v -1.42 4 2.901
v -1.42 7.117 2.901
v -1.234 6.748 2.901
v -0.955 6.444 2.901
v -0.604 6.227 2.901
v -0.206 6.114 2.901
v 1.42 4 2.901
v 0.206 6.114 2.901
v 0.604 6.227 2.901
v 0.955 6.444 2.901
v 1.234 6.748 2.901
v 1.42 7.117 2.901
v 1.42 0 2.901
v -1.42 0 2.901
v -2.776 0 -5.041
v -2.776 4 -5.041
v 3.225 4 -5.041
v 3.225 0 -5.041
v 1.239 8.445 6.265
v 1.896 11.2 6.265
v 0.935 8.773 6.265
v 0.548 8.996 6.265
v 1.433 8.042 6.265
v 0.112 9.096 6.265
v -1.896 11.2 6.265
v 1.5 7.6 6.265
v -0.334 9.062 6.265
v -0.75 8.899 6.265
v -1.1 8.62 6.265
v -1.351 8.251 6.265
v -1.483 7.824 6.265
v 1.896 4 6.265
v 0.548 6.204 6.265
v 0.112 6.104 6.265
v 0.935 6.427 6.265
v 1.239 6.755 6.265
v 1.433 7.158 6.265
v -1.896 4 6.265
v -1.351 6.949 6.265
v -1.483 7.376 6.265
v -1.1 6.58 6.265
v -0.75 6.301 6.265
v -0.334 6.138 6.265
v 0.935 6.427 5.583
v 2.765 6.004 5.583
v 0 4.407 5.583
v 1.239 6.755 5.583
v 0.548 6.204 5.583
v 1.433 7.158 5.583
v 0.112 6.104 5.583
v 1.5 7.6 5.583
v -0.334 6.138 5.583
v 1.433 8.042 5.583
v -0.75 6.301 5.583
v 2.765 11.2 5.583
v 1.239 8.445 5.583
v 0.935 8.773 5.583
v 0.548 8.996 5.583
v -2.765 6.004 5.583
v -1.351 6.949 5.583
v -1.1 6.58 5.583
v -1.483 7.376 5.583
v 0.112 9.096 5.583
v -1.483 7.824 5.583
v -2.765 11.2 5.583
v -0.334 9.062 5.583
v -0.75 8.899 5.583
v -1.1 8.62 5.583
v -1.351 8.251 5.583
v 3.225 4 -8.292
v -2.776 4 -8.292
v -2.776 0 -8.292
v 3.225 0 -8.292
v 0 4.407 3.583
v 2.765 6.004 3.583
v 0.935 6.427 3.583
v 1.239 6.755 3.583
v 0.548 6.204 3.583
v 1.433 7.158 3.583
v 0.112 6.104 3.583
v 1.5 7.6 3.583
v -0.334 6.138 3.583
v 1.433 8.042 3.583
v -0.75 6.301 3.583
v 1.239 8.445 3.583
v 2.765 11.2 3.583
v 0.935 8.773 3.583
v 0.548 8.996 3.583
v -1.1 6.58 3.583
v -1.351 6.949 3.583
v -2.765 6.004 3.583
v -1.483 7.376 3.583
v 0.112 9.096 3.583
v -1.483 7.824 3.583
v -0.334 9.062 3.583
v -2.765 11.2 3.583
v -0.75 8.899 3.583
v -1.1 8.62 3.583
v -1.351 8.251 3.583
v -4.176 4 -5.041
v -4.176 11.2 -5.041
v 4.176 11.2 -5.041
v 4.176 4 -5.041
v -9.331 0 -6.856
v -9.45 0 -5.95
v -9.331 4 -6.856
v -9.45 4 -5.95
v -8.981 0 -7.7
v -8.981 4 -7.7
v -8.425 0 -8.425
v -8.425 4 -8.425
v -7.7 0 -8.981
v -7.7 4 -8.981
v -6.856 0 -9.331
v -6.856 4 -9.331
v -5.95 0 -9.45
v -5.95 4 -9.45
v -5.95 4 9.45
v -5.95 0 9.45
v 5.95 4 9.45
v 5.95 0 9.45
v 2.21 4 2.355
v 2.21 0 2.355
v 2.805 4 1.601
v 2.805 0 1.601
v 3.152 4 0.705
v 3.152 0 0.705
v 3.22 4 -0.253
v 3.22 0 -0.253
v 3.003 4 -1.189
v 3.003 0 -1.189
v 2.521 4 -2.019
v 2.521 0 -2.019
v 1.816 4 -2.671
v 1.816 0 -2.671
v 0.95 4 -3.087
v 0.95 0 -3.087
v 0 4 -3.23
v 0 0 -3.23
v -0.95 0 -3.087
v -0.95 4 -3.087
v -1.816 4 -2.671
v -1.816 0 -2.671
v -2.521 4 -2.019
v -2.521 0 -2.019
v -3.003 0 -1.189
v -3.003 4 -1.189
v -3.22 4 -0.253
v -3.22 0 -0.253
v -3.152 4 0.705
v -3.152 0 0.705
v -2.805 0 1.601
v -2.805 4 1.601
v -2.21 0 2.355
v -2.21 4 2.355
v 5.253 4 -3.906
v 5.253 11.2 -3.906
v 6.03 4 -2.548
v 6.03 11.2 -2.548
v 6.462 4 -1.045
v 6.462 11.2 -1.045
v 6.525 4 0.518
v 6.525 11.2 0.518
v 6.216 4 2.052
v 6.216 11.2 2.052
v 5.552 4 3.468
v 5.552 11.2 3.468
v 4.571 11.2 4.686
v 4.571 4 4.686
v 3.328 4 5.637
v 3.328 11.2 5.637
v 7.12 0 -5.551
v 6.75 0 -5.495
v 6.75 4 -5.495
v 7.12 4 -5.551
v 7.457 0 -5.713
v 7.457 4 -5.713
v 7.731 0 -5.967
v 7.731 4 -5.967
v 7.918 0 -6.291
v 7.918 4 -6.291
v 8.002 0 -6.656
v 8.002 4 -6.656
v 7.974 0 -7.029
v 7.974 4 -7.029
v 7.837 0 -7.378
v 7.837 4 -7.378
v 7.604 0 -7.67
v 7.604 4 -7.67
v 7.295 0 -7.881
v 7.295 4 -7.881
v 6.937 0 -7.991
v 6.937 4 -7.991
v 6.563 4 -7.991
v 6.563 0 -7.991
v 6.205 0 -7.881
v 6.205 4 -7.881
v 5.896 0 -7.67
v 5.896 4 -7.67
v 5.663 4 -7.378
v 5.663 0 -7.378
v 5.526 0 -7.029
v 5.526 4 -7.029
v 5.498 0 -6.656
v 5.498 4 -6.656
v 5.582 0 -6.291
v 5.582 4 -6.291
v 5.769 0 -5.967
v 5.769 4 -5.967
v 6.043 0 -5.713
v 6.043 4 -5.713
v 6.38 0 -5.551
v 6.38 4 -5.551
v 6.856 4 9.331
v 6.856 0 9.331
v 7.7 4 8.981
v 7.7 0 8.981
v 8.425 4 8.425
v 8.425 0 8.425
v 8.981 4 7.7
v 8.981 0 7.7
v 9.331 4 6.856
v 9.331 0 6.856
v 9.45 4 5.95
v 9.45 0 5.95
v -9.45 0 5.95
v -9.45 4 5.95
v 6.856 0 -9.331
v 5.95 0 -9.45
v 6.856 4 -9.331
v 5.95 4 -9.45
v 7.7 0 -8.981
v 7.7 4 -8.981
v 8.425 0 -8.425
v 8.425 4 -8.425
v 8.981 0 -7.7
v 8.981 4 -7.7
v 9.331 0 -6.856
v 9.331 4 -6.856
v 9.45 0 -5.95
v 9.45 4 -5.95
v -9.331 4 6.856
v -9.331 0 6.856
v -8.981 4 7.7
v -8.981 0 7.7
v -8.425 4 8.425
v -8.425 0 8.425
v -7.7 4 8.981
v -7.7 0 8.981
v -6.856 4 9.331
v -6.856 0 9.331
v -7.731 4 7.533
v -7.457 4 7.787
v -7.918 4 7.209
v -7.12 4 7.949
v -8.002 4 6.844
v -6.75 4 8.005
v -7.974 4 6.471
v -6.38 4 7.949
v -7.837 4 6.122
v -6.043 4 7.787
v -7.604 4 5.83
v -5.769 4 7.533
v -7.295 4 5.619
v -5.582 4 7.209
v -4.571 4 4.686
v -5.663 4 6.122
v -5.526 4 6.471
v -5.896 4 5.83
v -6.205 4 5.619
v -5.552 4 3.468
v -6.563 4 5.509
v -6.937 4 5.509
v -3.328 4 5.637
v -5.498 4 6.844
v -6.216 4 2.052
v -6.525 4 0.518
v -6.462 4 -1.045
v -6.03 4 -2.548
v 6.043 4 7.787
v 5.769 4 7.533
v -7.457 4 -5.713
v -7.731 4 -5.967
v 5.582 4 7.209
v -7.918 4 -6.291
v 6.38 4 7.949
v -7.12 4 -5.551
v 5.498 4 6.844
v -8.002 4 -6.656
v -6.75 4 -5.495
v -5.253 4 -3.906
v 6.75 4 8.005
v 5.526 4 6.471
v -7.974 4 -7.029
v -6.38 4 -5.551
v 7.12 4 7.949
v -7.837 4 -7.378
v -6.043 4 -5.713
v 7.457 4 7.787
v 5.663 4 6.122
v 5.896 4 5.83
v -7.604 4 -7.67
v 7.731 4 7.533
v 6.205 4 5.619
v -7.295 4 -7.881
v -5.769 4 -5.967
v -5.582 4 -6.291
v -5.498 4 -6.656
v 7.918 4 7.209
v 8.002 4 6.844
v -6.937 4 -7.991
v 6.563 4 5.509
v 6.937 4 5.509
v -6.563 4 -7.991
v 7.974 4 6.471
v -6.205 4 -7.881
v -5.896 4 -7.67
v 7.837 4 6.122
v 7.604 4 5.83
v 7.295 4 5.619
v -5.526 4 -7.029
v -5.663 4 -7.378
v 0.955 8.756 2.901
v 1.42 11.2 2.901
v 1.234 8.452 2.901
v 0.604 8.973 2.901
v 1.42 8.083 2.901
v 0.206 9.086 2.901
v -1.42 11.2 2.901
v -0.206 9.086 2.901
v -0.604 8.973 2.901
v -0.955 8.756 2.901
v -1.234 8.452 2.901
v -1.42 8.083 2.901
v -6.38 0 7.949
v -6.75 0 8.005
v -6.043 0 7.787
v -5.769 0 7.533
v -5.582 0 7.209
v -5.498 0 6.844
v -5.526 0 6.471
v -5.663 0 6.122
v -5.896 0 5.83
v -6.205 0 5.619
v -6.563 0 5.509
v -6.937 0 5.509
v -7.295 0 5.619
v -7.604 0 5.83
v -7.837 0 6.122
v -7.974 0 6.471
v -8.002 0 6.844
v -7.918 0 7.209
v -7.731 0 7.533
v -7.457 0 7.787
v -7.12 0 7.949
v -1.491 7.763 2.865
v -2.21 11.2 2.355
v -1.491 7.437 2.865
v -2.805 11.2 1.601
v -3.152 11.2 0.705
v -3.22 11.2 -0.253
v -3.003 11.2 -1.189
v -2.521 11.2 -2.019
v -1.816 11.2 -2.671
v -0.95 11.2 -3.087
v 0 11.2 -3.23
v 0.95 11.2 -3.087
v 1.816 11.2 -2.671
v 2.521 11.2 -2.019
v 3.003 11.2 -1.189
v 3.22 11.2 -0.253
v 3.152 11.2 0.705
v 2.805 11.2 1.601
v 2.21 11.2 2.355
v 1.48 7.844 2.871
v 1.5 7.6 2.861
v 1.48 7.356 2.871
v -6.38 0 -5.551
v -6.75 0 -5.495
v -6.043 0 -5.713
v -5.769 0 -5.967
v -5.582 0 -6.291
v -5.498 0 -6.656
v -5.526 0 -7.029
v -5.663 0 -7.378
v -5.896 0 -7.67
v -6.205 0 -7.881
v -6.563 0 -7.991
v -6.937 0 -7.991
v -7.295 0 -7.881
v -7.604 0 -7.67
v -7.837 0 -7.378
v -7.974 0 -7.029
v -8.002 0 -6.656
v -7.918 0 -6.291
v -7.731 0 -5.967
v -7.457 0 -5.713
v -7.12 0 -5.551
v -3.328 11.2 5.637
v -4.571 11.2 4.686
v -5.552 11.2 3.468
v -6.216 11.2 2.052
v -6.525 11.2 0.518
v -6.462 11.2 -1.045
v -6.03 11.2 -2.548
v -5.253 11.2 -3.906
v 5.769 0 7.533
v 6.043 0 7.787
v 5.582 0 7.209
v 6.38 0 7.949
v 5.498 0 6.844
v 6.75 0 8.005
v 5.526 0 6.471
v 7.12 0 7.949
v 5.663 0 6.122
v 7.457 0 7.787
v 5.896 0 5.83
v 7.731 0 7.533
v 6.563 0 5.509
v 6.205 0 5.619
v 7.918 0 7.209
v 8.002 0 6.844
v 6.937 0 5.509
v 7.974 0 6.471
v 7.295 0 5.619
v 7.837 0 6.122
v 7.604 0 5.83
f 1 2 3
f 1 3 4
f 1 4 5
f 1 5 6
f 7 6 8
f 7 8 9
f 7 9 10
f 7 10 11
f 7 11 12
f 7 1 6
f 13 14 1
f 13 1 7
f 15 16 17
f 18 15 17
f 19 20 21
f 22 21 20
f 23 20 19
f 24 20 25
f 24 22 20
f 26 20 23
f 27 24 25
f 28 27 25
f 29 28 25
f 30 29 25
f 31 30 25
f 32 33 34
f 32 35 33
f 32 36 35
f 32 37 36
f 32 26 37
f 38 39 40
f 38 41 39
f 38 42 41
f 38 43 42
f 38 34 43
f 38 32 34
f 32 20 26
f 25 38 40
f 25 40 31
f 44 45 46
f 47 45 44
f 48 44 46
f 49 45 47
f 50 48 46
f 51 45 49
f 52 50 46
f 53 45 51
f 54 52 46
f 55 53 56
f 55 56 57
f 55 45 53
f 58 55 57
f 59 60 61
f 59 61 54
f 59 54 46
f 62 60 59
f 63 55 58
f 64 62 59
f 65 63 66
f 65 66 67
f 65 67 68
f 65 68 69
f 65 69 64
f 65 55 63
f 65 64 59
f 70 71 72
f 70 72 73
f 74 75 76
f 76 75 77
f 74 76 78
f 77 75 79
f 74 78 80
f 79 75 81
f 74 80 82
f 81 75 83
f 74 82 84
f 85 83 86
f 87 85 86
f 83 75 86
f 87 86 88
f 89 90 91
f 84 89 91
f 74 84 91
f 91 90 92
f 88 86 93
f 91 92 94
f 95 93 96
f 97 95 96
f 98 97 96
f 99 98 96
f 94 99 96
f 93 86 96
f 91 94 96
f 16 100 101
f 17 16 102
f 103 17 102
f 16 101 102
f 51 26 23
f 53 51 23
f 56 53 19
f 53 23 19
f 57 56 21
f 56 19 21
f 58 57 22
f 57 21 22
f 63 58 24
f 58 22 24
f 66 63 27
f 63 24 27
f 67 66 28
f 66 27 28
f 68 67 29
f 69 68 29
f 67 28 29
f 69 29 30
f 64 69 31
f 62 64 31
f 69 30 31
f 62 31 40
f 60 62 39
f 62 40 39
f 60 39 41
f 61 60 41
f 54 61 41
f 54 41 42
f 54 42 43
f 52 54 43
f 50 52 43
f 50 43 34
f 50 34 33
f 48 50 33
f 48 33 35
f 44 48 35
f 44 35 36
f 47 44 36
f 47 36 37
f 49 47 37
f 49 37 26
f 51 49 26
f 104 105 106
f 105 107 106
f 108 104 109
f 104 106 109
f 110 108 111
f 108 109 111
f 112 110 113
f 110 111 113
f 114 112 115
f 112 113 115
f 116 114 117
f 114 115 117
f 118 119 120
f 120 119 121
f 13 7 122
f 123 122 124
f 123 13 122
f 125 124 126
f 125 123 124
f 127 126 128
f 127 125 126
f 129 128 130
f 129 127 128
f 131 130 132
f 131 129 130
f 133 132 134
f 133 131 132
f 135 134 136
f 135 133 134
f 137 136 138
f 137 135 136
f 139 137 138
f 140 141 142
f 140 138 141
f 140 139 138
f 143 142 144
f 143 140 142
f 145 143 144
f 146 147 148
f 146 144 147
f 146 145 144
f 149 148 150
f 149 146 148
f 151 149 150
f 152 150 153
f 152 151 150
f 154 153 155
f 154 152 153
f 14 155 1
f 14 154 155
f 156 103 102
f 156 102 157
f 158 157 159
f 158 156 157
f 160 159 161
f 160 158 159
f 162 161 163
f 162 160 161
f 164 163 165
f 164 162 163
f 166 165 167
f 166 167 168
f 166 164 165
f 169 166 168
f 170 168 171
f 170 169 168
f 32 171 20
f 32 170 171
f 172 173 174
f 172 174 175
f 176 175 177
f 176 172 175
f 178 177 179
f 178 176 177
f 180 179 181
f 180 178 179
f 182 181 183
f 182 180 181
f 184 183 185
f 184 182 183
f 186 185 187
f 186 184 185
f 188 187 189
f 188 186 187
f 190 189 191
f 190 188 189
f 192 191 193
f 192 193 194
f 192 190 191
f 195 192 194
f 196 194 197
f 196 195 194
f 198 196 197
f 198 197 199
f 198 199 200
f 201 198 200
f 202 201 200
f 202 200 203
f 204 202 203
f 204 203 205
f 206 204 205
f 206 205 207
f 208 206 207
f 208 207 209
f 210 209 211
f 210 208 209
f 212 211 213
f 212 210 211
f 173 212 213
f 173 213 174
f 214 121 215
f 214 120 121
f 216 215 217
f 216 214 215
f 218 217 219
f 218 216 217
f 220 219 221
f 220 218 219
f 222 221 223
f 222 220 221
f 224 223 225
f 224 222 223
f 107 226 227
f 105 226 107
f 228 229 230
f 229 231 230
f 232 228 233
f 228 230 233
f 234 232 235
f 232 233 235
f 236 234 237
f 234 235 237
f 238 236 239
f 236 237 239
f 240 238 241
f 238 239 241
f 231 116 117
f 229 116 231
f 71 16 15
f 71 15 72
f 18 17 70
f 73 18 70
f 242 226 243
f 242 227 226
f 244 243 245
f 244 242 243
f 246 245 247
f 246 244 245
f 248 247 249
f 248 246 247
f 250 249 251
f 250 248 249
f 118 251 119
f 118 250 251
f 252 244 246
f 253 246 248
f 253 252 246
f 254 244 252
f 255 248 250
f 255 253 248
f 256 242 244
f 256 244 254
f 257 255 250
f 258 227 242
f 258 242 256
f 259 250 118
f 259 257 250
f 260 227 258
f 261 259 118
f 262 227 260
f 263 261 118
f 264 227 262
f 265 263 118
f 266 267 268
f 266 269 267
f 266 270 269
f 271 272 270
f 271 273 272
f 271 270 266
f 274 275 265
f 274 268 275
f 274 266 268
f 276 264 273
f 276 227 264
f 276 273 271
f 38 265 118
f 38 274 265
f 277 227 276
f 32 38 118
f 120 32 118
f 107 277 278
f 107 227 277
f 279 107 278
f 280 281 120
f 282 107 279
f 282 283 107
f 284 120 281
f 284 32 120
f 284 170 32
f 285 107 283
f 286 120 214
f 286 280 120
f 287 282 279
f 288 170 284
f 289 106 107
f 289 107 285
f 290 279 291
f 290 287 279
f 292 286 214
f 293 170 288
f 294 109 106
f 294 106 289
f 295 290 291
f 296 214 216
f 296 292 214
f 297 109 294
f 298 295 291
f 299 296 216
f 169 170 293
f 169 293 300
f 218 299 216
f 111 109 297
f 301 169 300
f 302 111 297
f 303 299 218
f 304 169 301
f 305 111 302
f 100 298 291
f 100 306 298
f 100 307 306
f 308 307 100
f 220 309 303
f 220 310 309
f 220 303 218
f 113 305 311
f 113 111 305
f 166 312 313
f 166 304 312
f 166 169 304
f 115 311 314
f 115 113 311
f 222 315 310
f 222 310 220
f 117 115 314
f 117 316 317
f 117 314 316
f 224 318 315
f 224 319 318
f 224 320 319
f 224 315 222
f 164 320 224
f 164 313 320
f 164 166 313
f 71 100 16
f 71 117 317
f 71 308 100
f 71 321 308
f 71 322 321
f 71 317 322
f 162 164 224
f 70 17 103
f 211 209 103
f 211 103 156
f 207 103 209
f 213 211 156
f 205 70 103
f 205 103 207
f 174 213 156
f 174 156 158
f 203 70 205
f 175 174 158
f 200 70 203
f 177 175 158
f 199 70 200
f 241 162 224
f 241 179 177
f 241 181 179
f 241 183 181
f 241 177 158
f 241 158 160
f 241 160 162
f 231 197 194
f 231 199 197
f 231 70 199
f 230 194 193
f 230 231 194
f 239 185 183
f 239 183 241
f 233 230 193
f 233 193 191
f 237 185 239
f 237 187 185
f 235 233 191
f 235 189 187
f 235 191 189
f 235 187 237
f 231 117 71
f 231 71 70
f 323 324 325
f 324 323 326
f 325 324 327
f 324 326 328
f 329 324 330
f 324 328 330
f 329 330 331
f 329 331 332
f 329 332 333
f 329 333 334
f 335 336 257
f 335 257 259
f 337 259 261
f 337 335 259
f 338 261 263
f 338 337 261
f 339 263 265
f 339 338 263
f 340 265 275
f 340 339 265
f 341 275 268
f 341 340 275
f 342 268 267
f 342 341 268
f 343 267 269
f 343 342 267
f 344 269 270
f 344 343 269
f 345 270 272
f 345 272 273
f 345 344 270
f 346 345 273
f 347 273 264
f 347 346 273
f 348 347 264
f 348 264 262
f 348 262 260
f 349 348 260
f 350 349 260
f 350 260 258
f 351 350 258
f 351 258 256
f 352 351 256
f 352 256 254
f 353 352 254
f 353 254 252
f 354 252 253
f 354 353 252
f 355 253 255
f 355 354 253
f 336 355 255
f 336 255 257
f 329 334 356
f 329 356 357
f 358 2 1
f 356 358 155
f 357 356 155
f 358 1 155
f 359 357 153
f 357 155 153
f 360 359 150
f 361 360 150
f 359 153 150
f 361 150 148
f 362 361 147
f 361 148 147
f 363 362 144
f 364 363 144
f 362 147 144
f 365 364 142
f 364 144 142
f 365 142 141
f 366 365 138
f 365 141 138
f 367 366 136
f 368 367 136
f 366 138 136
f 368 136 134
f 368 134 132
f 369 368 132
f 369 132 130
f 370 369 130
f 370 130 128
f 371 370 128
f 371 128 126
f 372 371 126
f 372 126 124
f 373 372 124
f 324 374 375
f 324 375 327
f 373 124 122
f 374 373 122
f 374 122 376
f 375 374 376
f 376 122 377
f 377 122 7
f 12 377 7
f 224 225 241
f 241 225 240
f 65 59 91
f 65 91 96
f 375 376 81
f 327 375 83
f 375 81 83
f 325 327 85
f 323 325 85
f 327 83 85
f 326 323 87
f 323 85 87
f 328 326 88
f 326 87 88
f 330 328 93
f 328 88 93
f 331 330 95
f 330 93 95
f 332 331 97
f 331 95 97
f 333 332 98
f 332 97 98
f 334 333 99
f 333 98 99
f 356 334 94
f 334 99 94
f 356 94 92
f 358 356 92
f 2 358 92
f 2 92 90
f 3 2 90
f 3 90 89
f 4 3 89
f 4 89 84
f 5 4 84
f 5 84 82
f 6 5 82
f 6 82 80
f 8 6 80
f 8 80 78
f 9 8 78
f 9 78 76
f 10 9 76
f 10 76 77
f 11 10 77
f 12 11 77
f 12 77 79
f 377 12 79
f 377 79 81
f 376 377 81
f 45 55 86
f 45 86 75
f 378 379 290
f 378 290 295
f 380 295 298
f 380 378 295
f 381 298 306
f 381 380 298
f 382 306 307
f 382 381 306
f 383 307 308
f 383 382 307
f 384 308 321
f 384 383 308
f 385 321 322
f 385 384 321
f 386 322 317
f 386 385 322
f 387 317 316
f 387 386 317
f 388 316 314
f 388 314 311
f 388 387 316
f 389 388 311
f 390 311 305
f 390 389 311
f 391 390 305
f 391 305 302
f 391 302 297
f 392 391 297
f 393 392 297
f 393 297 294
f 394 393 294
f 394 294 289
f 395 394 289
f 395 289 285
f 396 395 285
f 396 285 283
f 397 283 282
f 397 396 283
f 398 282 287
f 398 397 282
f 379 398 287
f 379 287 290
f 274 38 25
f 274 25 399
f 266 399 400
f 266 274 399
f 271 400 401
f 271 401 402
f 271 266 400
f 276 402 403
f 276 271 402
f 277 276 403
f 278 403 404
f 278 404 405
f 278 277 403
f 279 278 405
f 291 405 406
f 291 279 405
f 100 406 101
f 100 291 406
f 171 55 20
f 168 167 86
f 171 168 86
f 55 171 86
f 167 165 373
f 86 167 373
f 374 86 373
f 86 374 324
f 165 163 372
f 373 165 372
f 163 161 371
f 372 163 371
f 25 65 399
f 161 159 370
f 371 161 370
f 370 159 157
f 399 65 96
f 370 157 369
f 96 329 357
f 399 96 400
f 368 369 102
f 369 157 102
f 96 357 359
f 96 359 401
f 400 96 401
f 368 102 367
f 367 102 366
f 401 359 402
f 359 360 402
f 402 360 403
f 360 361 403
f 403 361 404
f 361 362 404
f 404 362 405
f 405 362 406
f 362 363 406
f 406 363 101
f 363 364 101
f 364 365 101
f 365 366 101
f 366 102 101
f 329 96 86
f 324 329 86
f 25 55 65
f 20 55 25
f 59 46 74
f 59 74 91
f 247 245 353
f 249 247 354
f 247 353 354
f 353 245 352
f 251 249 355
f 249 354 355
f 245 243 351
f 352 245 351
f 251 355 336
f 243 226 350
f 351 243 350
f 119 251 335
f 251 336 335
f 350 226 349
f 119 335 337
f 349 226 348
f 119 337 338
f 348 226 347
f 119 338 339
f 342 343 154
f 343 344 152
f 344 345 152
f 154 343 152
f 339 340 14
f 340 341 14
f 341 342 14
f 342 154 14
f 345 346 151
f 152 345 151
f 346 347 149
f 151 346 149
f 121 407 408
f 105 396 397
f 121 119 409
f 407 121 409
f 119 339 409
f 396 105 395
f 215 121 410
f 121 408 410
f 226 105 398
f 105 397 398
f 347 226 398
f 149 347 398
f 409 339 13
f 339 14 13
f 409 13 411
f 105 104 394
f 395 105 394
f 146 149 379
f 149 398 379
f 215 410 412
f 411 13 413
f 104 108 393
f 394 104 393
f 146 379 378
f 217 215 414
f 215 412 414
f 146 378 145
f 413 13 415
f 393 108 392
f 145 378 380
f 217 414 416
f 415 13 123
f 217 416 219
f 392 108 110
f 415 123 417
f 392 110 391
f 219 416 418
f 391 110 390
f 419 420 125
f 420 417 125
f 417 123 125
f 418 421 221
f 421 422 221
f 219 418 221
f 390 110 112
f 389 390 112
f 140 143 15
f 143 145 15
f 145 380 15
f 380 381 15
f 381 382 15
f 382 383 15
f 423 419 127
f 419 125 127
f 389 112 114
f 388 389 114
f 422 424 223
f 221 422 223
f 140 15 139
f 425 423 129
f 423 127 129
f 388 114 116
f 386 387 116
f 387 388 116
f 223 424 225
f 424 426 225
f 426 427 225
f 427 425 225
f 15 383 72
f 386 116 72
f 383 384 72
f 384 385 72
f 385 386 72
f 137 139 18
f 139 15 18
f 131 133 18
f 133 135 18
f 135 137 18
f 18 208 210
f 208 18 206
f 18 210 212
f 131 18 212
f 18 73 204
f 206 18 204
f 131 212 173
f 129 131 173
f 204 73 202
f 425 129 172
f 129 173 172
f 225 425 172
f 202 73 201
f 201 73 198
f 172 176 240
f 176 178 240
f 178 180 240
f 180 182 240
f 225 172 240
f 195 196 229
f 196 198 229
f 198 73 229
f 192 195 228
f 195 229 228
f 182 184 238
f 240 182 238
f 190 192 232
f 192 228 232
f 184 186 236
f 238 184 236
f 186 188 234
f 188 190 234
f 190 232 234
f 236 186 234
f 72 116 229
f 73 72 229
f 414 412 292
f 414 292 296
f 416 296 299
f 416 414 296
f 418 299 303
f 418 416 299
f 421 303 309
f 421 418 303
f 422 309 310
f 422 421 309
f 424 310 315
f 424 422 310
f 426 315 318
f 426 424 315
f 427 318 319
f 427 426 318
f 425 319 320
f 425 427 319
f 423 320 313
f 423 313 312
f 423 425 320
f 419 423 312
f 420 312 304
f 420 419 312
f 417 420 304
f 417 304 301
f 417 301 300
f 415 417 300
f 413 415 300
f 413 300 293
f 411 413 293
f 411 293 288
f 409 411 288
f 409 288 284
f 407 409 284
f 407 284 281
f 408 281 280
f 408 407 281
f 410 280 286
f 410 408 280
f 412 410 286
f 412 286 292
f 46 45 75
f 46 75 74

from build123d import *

# Parameters (mm, degrees)
SKETCH1_W               = 18.9
SKETCH1_H               = 18.9
SKETCH1_R               = 1.255147878
BOSS_EXTRUDE1_DEPTH     = 4
FILLET1_R               = 3.5
BOSS_EXTRUDE2_DEPTH     = 7.2
SKETCH3_R               = 1.5
CUT_EXTRUDE1_DEPTH      = 7.2
CUT_EXTRUDE2_DEPTH      = 1
CUT_EXTRUDE2_DEPTH_BACK = 1
CUT_EXTRUDE3_START      = -4
CUT_EXTRUDE3_DEPTH      = 4
SKETCH6_W               = 8.351743046
SKETCH6_H               = 2
CUT_EXTRUDE4_DEPTH      = 7.2
SKETCH7_W               = 6.001336377
SKETCH7_H               = 3.250686631
CUT_EXTRUDE5_DEPTH      = 4


with BuildPart() as part:
    # Sketch1 → Boss-Extrude1 (new body)
    with BuildSketch(Plane(origin=(0, 0, 0), x_dir=(1, 0, 0), z_dir=(0, 1, 0))):
        Rectangle(SKETCH1_W, SKETCH1_H)
        with Locations(Location((-6.75, 6.75, 0), (0, 0, 270))):
            Circle(SKETCH1_R, mode=Mode.SUBTRACT)
        with Locations(Location((6.75, 6.75, 0), (0, 0, 270))):
            Circle(SKETCH1_R, mode=Mode.SUBTRACT)
        with Locations(Location((6.75, -6.75, 0), (0, 0, 270))):
            Circle(SKETCH1_R, mode=Mode.SUBTRACT)
        with Locations(Location((-6.75, -6.75, 0), (0, 0, 270))):
            Circle(SKETCH1_R, mode=Mode.SUBTRACT)
    extrude(amount=BOSS_EXTRUDE1_DEPTH)

    # Fillet1
    fillet1_edges = [part.edges().sort_by_distance(p)[0] for p in [
        (-9.45, 2, 9.45),
        (-9.45, 2, -9.45),
        (9.45, 2, -9.45),
        (9.45, 2, 9.45),
    ]]
    fillet(fillet1_edges, radius=FILLET1_R)

    # Sketch2 → Boss-Extrude2 (add)
    with BuildSketch(Plane(origin=(0, 4, 0), x_dir=(1, 0, 0), z_dir=(0, 1, 0))):
        with BuildLine():
            Line((1.89565101, -6.265449543), (-1.89565101, -6.265449543))
            ThreePointArc((-1.89565101, -6.265449543), (0, 6.545941546), (1.89565101, -6.265449543))
        make_face()
        with BuildLine():
            Line((1.42, -2.901120473), (-1.42, -2.901120473))
            ThreePointArc((-1.42, -2.901120473), (0, 3.23), (1.42, -2.901120473))
        make_face(mode=Mode.SUBTRACT)
    extrude(amount=BOSS_EXTRUDE2_DEPTH)

    # Sketch3 → Cut-Extrude1 (cut)
    with BuildSketch(Plane.XY.offset(6.265449543)):
        with Locations((0, 7.6)):
            Circle(SKETCH3_R)
    extrude(amount=-CUT_EXTRUDE1_DEPTH, mode=Mode.SUBTRACT)

    # Sketch4 → Cut-Extrude2 (cut, two sides: drawn at the far end of the back side and taken through both)
    with BuildSketch(Plane(origin=(0, 0, 4.583285008), x_dir=(-1, 0, 0), z_dir=(0, 0, -1)).offset(-CUT_EXTRUDE2_DEPTH_BACK)):
        Polygon((-2.765, 9.196373494), (-2.765, 6.003626506), (0, 4.407253011), (2.765, 6.003626506), (2.765, 9.196373494), (0, 10.792746989), align=None)
        Polygon((2.765, 11.723212655), (-2.765, 11.723212655), (-2.765, 9.196373494), (0, 10.792746989), (2.765, 9.196373494), align=None)
    extrude(amount=CUT_EXTRUDE2_DEPTH + CUT_EXTRUDE2_DEPTH_BACK, mode=Mode.SUBTRACT)

    # Sketch5 → Cut-Extrude3 (cut)
    with BuildSketch(Plane(origin=(0, 4, 0), x_dir=(1, 0, 0), z_dir=(0, 1, 0)).offset(CUT_EXTRUDE3_START)):
        with BuildLine():
            Line((-1.42, -2.901120473), (1.42, -2.901120473))
            ThreePointArc((1.42, -2.901120473), (0, 3.23), (-1.42, -2.901120473))
        make_face()
    extrude(amount=CUT_EXTRUDE3_DEPTH, mode=Mode.SUBTRACT)

    # Sketch6 → Cut-Extrude4 (cut)
    with BuildSketch(Plane(origin=(0, 11.2, 0), x_dir=(1, 0, 0), z_dir=(0, 1, 0))):
        with Locations((0, 6.040976864)):
            Rectangle(SKETCH6_W, SKETCH6_H)
    extrude(amount=-CUT_EXTRUDE4_DEPTH, mode=Mode.SUBTRACT)

    # Sketch7 → Cut-Extrude5 (cut)
    with BuildSketch(Plane(origin=(0, 4, 0), x_dir=(1, 0, 0), z_dir=(0, 1, 0))):
        with Locations((0.224673796, 6.666320179)):
            Rectangle(SKETCH7_W, SKETCH7_H)
    extrude(amount=-CUT_EXTRUDE5_DEPTH, mode=Mode.SUBTRACT)


solid = part.part
